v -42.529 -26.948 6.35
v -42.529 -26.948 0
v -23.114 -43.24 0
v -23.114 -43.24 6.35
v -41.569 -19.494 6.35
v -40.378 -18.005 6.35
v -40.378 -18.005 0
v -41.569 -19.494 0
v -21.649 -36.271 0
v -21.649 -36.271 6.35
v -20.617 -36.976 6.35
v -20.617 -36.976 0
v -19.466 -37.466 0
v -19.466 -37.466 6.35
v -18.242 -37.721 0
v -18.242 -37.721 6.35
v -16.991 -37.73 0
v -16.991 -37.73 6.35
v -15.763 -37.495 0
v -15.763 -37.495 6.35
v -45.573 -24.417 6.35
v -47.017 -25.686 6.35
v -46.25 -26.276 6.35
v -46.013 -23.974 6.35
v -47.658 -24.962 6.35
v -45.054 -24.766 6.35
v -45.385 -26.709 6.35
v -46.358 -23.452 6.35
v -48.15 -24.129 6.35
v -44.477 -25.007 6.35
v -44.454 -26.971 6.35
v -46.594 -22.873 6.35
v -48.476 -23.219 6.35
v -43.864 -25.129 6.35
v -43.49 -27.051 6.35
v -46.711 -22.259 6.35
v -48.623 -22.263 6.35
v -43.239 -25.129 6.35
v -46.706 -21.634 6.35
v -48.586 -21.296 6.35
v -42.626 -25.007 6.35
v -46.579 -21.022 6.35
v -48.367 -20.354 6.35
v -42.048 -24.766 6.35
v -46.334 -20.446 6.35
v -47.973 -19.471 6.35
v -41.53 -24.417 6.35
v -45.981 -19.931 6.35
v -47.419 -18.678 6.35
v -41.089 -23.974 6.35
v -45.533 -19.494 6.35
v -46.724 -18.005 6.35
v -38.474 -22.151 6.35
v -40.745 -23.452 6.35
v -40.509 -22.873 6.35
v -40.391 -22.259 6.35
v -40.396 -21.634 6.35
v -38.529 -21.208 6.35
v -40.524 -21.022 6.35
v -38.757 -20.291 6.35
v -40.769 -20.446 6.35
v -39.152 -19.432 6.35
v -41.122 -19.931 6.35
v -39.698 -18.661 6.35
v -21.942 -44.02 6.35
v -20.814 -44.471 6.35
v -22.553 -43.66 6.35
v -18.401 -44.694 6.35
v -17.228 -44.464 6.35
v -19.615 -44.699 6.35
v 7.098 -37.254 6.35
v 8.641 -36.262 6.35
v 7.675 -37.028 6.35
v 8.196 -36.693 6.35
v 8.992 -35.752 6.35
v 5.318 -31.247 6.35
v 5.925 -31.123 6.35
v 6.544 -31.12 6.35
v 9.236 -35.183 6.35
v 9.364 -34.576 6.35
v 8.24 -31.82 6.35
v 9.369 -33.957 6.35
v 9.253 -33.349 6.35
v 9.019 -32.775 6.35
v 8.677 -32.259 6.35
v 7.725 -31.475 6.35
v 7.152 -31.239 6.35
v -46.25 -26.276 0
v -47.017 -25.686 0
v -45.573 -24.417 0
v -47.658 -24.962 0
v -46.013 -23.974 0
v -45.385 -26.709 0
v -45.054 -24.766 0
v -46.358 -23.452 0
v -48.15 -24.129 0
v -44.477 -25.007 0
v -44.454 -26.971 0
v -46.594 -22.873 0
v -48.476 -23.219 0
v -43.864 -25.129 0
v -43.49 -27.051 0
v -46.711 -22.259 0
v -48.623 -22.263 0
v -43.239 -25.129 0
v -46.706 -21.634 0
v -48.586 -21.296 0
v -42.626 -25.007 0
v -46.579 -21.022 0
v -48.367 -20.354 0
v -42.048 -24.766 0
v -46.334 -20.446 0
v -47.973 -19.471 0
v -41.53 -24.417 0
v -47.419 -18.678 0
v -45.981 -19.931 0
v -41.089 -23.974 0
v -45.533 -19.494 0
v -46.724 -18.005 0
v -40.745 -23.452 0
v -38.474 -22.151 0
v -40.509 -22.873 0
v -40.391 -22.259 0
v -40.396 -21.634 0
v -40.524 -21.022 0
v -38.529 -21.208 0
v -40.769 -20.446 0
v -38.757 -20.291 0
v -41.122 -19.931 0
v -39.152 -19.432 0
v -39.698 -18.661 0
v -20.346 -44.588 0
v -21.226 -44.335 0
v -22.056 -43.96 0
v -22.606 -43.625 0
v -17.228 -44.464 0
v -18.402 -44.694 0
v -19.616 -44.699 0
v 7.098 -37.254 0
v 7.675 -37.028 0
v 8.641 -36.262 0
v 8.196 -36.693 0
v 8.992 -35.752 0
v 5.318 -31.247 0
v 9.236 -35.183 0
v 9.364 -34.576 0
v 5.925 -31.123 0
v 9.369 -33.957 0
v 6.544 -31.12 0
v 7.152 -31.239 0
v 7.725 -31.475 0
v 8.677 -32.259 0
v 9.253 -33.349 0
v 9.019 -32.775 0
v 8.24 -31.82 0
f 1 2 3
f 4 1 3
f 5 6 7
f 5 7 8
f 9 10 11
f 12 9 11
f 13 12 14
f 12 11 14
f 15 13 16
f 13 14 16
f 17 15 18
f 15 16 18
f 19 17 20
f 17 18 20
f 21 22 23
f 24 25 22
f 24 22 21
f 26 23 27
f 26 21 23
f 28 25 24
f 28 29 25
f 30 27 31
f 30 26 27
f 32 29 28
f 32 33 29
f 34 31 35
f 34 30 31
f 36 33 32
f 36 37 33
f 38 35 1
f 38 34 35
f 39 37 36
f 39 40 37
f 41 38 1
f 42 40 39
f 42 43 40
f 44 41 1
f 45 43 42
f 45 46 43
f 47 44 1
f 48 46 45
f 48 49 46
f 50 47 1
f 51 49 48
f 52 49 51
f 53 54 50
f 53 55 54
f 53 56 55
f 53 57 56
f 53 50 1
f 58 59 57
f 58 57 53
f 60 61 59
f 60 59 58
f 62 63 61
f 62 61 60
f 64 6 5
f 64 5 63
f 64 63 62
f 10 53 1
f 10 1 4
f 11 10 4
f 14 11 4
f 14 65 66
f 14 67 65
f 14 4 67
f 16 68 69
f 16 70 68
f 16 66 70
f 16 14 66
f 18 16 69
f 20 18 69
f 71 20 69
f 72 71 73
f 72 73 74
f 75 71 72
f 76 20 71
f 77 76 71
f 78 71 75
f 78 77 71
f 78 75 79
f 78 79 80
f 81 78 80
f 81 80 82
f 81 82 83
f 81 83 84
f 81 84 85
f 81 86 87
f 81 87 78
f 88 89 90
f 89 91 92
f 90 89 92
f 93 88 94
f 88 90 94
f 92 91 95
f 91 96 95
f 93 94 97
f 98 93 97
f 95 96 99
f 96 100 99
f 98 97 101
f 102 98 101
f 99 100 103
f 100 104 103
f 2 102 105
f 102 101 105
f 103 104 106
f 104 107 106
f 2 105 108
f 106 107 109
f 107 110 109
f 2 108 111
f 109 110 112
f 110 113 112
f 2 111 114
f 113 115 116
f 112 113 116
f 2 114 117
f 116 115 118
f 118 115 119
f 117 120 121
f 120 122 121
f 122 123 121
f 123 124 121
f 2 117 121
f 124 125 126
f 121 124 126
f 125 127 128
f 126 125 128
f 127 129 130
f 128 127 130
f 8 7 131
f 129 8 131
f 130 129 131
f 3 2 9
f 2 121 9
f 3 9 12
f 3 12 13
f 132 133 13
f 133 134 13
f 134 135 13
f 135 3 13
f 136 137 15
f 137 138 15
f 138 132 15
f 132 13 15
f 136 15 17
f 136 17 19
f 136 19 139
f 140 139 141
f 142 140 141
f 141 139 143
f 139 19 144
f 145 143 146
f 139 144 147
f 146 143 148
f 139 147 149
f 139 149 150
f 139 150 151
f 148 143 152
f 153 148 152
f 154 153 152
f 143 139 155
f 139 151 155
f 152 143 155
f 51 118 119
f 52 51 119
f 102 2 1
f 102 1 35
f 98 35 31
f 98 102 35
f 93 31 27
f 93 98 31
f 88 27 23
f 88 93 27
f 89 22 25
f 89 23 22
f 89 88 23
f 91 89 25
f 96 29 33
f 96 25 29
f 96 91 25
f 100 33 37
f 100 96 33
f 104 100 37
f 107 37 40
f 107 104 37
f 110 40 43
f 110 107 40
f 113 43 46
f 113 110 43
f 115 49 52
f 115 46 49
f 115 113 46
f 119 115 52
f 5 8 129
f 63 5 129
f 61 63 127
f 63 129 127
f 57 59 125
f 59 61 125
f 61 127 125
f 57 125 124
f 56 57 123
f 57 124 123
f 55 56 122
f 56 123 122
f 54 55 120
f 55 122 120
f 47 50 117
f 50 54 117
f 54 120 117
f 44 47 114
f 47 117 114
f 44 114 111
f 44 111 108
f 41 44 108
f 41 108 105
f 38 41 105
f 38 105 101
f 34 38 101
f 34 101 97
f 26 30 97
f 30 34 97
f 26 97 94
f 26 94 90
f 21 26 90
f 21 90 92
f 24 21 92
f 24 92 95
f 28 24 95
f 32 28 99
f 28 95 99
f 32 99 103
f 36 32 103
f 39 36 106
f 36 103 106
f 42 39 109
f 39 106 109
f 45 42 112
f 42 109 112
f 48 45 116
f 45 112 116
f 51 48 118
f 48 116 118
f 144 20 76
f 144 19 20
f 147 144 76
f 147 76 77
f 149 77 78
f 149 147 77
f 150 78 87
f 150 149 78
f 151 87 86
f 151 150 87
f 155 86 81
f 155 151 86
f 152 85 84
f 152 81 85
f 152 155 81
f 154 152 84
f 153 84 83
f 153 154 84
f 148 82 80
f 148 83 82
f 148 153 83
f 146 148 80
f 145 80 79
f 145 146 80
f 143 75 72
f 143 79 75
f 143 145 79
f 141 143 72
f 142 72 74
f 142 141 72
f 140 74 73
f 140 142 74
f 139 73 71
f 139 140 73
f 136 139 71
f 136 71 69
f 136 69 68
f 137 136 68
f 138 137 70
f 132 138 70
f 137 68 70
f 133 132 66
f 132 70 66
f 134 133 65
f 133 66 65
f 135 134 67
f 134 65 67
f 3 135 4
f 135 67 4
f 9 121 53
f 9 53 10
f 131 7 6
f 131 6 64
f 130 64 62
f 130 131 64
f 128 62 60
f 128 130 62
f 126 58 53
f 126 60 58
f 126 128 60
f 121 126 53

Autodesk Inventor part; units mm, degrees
ref_plane "YZ Plane" through (0, 0, 0) normal (1, 0, 0) x (0, 1, 0)
ref_plane "XZ Plane" through (0, 0, 0) normal (0, 1, 0) x (-1, 0, 0)
ref_plane "XY Plane" through (0, 0, 0) normal (0, 0, 1) x (1, 0, 0)
sketch "Sketch1" plane through (0, 0, 0) normal (0, 0, 1) x (1, 0, 0)
  line L0 (7.0984, -37.2544) -> (-17.2546, -44.4717)
  line L1 (-19.0349, -38.4646) -> (5.3181, -31.2472)
  arc A0 (7.0984, -37.2544) -> (5.3181, -31.2472) centre (6.2488, -34.2388) ccw
  line L2 (-42.5288, -26.9478) -> (-20.5002, -45.4336)
  line L3 (-20.5002, -45.4336) -> (-17.2546, -44.4717)
  line L4 (-38.4744, -22.1514) -> (-19.0349, -38.4646)
  line L5 (-40.3781, -18.0047) -> (-41.5692, -19.4938)
  line L6 (-45.5333, -19.4938) -> (-46.7244, -18.0047)
  arc A1 (-45.5333, -19.4938) -> (-41.5692, -19.4938) centre (-43.5513, -21.9717) ccw
  arc A2 (-46.7244, -18.0047) -> (-42.5288, -26.9478) centre (-43.5513, -21.9717) ccw
  arc A3 (-38.4744, -22.1514) -> (-40.3781, -18.0047) centre (-43.5513, -21.9717) ccw
  point P0 (0, 0)
  point P1 (0, 0)
extrude "Extrusion1" add sketch "Sketch1" along normal blind 6.35
fillet "Fillet1" radius 6.35 2 edges at (-20.5002, -45.4336, 3.175) (-19.0349, -38.4646, 3.175)
properties part number "Holder left arm"
